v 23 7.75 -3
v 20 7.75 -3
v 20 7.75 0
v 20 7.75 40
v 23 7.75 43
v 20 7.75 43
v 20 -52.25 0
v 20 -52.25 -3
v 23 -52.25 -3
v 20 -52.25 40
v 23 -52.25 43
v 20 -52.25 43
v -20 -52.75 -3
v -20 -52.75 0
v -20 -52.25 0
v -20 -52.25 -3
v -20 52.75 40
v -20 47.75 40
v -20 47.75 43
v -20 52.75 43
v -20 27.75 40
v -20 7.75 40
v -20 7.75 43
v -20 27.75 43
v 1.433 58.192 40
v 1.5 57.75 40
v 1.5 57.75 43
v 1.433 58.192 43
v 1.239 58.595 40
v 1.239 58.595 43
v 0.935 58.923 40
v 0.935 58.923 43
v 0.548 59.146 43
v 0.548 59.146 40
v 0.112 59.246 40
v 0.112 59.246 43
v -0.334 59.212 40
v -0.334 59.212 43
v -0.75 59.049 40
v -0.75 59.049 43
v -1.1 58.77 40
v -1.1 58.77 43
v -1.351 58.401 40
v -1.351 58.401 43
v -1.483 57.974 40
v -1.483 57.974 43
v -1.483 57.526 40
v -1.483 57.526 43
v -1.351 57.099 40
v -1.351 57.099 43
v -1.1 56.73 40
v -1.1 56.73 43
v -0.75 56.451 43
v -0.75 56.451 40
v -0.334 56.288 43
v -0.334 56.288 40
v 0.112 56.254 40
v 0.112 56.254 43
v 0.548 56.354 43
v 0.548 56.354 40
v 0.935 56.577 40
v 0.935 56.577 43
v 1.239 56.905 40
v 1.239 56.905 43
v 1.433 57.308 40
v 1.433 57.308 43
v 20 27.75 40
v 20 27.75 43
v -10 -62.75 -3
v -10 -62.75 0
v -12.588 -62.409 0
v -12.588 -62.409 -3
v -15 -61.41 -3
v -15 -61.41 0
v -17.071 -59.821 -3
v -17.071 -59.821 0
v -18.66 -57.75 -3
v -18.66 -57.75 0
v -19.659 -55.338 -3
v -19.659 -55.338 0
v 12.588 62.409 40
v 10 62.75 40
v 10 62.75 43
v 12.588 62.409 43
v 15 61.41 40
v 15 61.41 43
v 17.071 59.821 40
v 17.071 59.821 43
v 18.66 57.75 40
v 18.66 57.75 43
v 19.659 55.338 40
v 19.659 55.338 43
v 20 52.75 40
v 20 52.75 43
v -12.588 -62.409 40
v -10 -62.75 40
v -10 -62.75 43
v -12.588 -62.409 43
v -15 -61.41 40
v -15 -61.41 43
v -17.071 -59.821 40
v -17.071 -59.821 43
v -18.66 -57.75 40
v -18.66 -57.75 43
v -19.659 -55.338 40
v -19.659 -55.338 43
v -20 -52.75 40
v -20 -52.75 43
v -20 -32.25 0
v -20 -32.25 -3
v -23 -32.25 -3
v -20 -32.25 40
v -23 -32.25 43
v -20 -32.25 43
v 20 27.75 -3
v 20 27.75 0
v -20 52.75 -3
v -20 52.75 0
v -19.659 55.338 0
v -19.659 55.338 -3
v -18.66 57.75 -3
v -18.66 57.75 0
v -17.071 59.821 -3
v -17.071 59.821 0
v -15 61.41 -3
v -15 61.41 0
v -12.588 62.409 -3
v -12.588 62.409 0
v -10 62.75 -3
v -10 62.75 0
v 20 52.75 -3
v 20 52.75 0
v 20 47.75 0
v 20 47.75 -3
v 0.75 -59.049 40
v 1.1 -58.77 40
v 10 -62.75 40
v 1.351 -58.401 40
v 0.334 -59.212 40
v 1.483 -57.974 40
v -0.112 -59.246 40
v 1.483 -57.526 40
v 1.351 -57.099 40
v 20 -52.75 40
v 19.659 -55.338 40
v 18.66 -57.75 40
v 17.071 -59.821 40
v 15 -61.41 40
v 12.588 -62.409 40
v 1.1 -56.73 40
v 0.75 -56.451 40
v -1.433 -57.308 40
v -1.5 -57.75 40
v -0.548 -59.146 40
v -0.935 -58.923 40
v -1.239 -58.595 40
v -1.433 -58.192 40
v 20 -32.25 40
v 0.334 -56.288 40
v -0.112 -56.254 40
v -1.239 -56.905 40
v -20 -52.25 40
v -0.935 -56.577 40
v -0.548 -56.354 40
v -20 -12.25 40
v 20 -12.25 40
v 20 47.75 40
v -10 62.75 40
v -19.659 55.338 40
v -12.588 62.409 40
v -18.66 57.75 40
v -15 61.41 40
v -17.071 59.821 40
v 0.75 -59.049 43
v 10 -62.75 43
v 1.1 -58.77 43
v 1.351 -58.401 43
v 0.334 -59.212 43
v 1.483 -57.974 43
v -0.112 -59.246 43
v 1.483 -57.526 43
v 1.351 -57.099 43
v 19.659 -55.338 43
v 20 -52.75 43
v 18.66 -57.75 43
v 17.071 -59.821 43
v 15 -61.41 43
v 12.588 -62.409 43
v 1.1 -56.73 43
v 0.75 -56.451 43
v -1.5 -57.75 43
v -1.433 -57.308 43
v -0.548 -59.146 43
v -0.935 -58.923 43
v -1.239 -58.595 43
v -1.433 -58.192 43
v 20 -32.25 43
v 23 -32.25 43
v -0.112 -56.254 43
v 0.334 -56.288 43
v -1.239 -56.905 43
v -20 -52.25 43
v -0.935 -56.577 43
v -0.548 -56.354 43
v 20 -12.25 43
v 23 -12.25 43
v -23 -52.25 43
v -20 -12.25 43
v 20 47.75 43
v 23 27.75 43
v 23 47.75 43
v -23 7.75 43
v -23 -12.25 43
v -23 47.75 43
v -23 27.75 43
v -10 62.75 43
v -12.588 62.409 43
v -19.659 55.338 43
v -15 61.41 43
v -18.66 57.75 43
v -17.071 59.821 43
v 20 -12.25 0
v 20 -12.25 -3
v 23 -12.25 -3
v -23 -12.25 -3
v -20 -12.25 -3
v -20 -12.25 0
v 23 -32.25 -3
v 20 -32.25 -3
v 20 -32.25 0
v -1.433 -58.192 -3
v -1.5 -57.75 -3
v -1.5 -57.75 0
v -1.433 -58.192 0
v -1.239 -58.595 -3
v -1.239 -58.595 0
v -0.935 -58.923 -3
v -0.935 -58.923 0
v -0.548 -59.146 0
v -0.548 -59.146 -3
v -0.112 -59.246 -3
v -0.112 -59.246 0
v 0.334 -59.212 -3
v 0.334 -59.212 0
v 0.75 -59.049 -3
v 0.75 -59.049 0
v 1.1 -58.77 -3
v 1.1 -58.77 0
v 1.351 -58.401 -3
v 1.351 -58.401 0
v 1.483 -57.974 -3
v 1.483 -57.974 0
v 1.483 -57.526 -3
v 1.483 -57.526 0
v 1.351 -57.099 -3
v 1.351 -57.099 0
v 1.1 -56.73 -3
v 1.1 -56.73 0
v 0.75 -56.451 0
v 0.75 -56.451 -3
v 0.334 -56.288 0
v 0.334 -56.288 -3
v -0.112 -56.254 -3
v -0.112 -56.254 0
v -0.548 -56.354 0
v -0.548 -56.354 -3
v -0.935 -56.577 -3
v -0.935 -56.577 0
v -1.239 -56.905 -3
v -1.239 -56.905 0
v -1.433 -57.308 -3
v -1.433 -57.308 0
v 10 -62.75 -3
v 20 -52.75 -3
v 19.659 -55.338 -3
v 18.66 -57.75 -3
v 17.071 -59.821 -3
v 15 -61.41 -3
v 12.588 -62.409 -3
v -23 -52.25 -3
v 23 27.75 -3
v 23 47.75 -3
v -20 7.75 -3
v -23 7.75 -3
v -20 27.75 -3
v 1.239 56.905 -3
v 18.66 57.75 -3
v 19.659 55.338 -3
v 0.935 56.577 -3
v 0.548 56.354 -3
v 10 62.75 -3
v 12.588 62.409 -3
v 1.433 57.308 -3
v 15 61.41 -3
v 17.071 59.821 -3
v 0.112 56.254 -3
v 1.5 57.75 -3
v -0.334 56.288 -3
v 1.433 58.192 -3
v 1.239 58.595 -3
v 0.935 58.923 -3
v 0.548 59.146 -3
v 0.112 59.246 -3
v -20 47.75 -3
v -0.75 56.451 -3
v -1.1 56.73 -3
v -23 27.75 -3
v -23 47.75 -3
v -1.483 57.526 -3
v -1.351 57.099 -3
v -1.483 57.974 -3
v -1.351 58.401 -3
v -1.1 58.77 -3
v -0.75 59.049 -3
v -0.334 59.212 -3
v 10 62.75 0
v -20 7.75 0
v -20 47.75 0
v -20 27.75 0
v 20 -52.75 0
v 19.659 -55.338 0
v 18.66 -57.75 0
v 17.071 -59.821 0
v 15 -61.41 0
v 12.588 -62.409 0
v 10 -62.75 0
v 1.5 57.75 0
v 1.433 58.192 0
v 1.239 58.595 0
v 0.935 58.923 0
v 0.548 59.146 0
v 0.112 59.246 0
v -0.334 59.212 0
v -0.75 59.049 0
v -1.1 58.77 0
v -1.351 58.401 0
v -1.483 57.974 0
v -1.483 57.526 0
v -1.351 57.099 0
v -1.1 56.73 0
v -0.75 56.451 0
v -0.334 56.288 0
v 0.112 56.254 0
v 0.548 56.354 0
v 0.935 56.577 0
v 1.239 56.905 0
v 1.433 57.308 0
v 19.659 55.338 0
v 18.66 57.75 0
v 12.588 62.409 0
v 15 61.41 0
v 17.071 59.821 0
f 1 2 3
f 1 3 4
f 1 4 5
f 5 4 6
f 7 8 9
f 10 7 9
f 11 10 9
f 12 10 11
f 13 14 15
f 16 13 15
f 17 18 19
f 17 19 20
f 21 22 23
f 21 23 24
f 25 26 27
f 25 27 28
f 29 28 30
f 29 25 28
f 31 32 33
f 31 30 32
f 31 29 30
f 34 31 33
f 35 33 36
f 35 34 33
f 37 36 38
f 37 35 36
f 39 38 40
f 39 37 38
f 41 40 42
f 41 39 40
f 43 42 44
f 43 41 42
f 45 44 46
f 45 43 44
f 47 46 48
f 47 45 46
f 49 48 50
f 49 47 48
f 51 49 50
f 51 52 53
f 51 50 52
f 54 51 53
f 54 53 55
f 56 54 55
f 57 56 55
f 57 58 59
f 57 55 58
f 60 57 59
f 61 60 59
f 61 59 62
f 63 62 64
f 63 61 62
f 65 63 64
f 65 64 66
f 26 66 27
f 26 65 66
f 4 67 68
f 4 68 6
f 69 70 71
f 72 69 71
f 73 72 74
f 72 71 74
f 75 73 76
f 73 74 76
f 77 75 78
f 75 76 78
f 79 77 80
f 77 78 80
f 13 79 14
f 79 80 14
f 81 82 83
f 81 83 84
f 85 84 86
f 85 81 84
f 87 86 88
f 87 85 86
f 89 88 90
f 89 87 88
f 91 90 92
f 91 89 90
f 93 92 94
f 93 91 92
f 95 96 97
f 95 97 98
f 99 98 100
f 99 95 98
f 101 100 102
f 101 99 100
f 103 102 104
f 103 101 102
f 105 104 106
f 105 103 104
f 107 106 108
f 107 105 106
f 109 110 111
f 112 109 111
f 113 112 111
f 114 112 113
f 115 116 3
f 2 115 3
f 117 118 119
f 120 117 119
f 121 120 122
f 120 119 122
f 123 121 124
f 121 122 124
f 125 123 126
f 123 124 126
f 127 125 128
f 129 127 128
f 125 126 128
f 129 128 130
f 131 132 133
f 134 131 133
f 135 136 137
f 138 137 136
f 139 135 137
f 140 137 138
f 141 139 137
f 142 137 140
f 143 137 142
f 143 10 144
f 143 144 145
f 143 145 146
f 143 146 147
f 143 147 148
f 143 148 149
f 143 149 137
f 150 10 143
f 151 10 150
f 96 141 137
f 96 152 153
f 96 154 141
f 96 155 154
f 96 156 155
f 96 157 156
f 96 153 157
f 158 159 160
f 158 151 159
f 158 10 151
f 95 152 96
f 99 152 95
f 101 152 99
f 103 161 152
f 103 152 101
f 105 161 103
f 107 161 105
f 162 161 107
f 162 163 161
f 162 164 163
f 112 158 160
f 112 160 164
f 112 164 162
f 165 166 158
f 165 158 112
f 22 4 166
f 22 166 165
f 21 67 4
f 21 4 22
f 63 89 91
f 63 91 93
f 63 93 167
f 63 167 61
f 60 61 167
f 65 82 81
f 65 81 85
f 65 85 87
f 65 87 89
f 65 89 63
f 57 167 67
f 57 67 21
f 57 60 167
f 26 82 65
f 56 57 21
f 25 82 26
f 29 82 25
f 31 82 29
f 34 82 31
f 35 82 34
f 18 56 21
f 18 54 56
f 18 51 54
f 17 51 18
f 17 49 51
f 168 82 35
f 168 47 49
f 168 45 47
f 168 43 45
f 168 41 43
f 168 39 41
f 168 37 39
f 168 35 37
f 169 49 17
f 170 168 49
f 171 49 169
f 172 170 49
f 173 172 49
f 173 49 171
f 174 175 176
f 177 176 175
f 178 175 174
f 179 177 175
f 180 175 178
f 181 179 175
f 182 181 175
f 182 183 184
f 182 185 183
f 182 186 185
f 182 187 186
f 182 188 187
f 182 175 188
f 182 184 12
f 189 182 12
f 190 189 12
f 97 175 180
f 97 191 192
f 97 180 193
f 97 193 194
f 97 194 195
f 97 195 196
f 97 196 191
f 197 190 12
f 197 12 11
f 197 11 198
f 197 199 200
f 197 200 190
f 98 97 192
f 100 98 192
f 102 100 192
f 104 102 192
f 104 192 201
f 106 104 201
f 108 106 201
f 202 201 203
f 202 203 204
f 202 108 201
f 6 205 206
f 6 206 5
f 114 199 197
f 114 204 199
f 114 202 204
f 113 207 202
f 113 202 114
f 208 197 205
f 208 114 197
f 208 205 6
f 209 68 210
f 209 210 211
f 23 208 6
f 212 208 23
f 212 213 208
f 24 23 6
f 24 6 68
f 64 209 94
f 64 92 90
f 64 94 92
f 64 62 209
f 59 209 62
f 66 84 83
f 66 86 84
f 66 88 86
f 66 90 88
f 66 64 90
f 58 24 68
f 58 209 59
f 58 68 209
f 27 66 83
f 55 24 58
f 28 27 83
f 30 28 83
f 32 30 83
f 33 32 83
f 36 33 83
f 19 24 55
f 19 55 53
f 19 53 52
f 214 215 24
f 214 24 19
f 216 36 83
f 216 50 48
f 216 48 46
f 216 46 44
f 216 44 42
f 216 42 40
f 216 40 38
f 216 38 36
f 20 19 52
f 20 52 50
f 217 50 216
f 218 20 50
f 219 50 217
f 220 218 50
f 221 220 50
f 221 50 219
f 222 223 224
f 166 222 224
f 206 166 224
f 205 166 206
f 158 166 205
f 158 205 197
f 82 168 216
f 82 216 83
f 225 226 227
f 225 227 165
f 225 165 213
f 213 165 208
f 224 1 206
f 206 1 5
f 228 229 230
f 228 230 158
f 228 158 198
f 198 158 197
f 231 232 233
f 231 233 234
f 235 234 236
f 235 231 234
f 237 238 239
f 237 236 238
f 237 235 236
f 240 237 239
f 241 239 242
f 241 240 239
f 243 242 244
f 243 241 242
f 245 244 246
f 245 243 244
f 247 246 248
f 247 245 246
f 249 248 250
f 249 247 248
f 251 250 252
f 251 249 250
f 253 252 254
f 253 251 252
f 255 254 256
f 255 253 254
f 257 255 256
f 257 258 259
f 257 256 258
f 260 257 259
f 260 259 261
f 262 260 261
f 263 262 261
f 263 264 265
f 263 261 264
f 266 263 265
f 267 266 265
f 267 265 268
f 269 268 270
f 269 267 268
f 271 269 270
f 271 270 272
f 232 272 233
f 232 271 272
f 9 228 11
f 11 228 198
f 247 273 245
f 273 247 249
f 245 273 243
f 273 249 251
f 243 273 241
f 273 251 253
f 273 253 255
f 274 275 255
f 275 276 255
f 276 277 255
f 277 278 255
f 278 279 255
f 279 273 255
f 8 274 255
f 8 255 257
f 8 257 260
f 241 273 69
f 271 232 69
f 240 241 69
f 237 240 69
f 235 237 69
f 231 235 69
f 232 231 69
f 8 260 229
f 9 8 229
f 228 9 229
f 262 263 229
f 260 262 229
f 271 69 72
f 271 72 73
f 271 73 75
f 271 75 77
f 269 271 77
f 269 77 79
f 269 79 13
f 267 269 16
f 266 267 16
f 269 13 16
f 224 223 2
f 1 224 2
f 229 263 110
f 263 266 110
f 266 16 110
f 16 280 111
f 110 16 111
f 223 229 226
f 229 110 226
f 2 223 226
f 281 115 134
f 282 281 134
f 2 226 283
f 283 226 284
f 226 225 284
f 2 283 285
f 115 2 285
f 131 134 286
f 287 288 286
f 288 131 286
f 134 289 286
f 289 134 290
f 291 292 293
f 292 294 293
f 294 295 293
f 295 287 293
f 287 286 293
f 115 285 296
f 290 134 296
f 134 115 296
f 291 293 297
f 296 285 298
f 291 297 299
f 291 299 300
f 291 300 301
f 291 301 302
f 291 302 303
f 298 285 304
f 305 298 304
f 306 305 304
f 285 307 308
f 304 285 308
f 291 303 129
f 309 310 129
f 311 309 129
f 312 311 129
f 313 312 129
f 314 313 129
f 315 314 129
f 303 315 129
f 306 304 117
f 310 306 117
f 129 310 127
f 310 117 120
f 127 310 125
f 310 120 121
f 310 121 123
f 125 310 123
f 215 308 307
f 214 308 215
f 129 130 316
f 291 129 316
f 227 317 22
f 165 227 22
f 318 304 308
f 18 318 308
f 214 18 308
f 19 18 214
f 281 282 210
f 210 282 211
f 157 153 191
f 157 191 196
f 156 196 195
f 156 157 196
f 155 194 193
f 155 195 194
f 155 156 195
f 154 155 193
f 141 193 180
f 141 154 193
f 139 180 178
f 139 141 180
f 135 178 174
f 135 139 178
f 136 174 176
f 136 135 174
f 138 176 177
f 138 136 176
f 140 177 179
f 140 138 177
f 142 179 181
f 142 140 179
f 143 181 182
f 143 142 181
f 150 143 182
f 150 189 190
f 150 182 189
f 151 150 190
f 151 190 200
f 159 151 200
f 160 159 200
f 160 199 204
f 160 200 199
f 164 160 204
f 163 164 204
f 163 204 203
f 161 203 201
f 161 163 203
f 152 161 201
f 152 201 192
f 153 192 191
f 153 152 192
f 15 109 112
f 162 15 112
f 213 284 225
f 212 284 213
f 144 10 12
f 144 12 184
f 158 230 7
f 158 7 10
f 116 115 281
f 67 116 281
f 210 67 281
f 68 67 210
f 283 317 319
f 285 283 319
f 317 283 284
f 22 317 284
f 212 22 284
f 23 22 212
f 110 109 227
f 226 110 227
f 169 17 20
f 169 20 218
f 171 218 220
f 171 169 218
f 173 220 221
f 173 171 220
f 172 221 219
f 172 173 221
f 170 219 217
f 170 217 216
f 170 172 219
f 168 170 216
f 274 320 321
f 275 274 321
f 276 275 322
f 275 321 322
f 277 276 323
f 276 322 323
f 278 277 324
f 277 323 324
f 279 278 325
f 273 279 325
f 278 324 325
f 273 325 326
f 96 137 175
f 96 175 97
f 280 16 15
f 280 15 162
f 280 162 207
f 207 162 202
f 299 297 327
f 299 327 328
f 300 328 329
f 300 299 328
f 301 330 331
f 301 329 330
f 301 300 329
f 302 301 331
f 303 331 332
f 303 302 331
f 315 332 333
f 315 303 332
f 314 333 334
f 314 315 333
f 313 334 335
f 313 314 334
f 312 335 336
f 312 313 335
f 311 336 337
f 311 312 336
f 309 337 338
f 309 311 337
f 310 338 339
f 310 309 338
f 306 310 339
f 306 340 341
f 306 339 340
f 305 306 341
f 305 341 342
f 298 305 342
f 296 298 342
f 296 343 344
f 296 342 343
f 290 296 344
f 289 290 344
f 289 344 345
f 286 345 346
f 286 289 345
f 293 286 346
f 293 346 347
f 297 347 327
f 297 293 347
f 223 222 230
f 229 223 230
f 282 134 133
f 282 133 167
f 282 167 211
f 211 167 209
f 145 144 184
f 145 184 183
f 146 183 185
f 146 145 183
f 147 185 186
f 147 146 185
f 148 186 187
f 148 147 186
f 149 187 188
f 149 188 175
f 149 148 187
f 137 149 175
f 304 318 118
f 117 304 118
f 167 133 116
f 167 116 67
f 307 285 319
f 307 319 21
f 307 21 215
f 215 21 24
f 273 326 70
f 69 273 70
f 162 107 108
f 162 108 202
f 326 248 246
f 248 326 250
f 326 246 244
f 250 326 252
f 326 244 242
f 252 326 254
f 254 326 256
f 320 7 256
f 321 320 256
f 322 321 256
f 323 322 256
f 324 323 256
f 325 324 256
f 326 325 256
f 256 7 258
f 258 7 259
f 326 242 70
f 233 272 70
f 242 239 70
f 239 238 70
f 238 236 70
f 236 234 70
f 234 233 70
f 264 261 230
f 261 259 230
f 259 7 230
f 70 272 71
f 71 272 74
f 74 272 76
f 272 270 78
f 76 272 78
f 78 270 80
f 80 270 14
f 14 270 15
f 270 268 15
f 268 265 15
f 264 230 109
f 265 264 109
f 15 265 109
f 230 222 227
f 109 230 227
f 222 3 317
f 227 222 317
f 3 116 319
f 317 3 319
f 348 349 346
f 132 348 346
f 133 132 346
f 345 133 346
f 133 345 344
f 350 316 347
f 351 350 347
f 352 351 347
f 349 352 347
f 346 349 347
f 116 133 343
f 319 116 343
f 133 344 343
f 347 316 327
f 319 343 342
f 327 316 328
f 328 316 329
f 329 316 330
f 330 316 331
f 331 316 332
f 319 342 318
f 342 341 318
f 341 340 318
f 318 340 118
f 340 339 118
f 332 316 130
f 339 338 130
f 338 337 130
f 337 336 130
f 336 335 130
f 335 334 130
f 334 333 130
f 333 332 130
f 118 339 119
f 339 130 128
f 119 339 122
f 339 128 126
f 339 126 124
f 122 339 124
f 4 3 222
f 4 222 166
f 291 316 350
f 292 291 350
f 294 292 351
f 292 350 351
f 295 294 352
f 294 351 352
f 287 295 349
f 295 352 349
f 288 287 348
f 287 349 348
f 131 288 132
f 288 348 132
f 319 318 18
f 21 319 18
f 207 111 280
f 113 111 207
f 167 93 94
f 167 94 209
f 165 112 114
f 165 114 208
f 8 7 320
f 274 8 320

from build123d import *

# Parameters (mm, degrees)
BOSS_EXTRUDE1_START     = 40
BOSS_EXTRUDE1_DEPTH     = 3
BOSS_EXTRUDE2_DEPTH     = 3
CUT_EXTRUDE1_DEPTH      = 79.654704246
CUT_EXTRUDE1_DEPTH_BACK = 79.654704246
SKETCH2_R               = 1.5
SKETCH3_W               = 46
SKETCH3_H               = 20
BOSS_EXTRUDE4_DEPTH     = 3


with BuildPart() as part:
    # Sketch1 → Boss-Extrude1 (new body)
    with BuildSketch(Plane.XY.offset(BOSS_EXTRUDE1_START)):
        with BuildLine():
            Line((-10, 62.75), (10, 62.75))
            ThreePointArc((10, 62.75), (17.071067812, 59.821067812), (20, 52.75))
            Line((20, 52.75), (20, -52.75))
            ThreePointArc((20, -52.75), (17.071067812, -59.821067812), (10, -62.75))
            Line((10, -62.75), (-10, -62.75))
            ThreePointArc((-10, -62.75), (-17.071067812, -59.821067812), (-20, -52.75))
            Line((-20, -52.75), (-20, 52.75))
            ThreePointArc((-20, 52.75), (-17.071067812, 59.821067812), (-10, 62.75))
        make_face()
    extrude(amount=BOSS_EXTRUDE1_DEPTH)


with BuildPart() as body_2:
    # Sketch1<3> → Boss-Extrude2 (new body)
    with BuildSketch(Plane.XY):
        with BuildLine():
            Line((-10, 62.75), (10, 62.75))
            ThreePointArc((10, 62.75), (17.071067812, 59.821067812), (20, 52.75))
            Line((20, 52.75), (20, -52.75))
            ThreePointArc((20, -52.75), (17.071067812, -59.821067812), (10, -62.75))
            Line((10, -62.75), (-10, -62.75))
            ThreePointArc((-10, -62.75), (-17.071067812, -59.821067812), (-20, -52.75))
            Line((-20, -52.75), (-20, 52.75))
            ThreePointArc((-20, 52.75), (-17.071067812, 59.821067812), (-10, 62.75))
        make_face()
    extrude(amount=-BOSS_EXTRUDE2_DEPTH)


with BuildPart() as cut_extrude1_tool:
    # Sketch2 → Cut-Extrude1 (new, two sides: drawn at the far end of the back side and taken through both)
    with BuildSketch(Plane.XY.offset(-CUT_EXTRUDE1_DEPTH_BACK)):
        with Locations((0, 57.75)):
            Circle(SKETCH2_R)
        with Locations((0, -57.75)):
            Circle(SKETCH2_R)
    extrude(amount=CUT_EXTRUDE1_DEPTH + CUT_EXTRUDE1_DEPTH_BACK)


with BuildPart() as part_1:
    add(part.part)

    # Cut-Extrude1: cut by cut_extrude1_tool
    add(cut_extrude1_tool.part, mode=Mode.SUBTRACT)



with BuildPart() as body_2_1:
    add(body_2.part)

    # Cut-Extrude1: cut by cut_extrude1_tool
    add(cut_extrude1_tool.part, mode=Mode.SUBTRACT)


with BuildPart() as part_2:
    add(part_1.part)

    add(body_2_1.part)  # Boss-Extrude4 merges body 2
    # Sketch3 → Boss-Extrude4 (add)
    with BuildSketch(Plane.ZY.offset(20)):
        with Locations((20, 37.75)):
            Rectangle(SKETCH3_W, SKETCH3_H)
        with Locations((20, -2.25)):
            Rectangle(SKETCH3_W, SKETCH3_H)
        with Locations((20, -42.25)):
            Rectangle(SKETCH3_W, SKETCH3_H)
    boss_extrude4 = extrude(amount=BOSS_EXTRUDE4_DEPTH)

    # Mirror1: Boss-Extrude4 across plane
    add(boss_extrude4.mirror(Plane(origin=(0, 0, 0), x_dir=(0, 0, 1), z_dir=(1, 0, 0))))


solid = part_2.part
